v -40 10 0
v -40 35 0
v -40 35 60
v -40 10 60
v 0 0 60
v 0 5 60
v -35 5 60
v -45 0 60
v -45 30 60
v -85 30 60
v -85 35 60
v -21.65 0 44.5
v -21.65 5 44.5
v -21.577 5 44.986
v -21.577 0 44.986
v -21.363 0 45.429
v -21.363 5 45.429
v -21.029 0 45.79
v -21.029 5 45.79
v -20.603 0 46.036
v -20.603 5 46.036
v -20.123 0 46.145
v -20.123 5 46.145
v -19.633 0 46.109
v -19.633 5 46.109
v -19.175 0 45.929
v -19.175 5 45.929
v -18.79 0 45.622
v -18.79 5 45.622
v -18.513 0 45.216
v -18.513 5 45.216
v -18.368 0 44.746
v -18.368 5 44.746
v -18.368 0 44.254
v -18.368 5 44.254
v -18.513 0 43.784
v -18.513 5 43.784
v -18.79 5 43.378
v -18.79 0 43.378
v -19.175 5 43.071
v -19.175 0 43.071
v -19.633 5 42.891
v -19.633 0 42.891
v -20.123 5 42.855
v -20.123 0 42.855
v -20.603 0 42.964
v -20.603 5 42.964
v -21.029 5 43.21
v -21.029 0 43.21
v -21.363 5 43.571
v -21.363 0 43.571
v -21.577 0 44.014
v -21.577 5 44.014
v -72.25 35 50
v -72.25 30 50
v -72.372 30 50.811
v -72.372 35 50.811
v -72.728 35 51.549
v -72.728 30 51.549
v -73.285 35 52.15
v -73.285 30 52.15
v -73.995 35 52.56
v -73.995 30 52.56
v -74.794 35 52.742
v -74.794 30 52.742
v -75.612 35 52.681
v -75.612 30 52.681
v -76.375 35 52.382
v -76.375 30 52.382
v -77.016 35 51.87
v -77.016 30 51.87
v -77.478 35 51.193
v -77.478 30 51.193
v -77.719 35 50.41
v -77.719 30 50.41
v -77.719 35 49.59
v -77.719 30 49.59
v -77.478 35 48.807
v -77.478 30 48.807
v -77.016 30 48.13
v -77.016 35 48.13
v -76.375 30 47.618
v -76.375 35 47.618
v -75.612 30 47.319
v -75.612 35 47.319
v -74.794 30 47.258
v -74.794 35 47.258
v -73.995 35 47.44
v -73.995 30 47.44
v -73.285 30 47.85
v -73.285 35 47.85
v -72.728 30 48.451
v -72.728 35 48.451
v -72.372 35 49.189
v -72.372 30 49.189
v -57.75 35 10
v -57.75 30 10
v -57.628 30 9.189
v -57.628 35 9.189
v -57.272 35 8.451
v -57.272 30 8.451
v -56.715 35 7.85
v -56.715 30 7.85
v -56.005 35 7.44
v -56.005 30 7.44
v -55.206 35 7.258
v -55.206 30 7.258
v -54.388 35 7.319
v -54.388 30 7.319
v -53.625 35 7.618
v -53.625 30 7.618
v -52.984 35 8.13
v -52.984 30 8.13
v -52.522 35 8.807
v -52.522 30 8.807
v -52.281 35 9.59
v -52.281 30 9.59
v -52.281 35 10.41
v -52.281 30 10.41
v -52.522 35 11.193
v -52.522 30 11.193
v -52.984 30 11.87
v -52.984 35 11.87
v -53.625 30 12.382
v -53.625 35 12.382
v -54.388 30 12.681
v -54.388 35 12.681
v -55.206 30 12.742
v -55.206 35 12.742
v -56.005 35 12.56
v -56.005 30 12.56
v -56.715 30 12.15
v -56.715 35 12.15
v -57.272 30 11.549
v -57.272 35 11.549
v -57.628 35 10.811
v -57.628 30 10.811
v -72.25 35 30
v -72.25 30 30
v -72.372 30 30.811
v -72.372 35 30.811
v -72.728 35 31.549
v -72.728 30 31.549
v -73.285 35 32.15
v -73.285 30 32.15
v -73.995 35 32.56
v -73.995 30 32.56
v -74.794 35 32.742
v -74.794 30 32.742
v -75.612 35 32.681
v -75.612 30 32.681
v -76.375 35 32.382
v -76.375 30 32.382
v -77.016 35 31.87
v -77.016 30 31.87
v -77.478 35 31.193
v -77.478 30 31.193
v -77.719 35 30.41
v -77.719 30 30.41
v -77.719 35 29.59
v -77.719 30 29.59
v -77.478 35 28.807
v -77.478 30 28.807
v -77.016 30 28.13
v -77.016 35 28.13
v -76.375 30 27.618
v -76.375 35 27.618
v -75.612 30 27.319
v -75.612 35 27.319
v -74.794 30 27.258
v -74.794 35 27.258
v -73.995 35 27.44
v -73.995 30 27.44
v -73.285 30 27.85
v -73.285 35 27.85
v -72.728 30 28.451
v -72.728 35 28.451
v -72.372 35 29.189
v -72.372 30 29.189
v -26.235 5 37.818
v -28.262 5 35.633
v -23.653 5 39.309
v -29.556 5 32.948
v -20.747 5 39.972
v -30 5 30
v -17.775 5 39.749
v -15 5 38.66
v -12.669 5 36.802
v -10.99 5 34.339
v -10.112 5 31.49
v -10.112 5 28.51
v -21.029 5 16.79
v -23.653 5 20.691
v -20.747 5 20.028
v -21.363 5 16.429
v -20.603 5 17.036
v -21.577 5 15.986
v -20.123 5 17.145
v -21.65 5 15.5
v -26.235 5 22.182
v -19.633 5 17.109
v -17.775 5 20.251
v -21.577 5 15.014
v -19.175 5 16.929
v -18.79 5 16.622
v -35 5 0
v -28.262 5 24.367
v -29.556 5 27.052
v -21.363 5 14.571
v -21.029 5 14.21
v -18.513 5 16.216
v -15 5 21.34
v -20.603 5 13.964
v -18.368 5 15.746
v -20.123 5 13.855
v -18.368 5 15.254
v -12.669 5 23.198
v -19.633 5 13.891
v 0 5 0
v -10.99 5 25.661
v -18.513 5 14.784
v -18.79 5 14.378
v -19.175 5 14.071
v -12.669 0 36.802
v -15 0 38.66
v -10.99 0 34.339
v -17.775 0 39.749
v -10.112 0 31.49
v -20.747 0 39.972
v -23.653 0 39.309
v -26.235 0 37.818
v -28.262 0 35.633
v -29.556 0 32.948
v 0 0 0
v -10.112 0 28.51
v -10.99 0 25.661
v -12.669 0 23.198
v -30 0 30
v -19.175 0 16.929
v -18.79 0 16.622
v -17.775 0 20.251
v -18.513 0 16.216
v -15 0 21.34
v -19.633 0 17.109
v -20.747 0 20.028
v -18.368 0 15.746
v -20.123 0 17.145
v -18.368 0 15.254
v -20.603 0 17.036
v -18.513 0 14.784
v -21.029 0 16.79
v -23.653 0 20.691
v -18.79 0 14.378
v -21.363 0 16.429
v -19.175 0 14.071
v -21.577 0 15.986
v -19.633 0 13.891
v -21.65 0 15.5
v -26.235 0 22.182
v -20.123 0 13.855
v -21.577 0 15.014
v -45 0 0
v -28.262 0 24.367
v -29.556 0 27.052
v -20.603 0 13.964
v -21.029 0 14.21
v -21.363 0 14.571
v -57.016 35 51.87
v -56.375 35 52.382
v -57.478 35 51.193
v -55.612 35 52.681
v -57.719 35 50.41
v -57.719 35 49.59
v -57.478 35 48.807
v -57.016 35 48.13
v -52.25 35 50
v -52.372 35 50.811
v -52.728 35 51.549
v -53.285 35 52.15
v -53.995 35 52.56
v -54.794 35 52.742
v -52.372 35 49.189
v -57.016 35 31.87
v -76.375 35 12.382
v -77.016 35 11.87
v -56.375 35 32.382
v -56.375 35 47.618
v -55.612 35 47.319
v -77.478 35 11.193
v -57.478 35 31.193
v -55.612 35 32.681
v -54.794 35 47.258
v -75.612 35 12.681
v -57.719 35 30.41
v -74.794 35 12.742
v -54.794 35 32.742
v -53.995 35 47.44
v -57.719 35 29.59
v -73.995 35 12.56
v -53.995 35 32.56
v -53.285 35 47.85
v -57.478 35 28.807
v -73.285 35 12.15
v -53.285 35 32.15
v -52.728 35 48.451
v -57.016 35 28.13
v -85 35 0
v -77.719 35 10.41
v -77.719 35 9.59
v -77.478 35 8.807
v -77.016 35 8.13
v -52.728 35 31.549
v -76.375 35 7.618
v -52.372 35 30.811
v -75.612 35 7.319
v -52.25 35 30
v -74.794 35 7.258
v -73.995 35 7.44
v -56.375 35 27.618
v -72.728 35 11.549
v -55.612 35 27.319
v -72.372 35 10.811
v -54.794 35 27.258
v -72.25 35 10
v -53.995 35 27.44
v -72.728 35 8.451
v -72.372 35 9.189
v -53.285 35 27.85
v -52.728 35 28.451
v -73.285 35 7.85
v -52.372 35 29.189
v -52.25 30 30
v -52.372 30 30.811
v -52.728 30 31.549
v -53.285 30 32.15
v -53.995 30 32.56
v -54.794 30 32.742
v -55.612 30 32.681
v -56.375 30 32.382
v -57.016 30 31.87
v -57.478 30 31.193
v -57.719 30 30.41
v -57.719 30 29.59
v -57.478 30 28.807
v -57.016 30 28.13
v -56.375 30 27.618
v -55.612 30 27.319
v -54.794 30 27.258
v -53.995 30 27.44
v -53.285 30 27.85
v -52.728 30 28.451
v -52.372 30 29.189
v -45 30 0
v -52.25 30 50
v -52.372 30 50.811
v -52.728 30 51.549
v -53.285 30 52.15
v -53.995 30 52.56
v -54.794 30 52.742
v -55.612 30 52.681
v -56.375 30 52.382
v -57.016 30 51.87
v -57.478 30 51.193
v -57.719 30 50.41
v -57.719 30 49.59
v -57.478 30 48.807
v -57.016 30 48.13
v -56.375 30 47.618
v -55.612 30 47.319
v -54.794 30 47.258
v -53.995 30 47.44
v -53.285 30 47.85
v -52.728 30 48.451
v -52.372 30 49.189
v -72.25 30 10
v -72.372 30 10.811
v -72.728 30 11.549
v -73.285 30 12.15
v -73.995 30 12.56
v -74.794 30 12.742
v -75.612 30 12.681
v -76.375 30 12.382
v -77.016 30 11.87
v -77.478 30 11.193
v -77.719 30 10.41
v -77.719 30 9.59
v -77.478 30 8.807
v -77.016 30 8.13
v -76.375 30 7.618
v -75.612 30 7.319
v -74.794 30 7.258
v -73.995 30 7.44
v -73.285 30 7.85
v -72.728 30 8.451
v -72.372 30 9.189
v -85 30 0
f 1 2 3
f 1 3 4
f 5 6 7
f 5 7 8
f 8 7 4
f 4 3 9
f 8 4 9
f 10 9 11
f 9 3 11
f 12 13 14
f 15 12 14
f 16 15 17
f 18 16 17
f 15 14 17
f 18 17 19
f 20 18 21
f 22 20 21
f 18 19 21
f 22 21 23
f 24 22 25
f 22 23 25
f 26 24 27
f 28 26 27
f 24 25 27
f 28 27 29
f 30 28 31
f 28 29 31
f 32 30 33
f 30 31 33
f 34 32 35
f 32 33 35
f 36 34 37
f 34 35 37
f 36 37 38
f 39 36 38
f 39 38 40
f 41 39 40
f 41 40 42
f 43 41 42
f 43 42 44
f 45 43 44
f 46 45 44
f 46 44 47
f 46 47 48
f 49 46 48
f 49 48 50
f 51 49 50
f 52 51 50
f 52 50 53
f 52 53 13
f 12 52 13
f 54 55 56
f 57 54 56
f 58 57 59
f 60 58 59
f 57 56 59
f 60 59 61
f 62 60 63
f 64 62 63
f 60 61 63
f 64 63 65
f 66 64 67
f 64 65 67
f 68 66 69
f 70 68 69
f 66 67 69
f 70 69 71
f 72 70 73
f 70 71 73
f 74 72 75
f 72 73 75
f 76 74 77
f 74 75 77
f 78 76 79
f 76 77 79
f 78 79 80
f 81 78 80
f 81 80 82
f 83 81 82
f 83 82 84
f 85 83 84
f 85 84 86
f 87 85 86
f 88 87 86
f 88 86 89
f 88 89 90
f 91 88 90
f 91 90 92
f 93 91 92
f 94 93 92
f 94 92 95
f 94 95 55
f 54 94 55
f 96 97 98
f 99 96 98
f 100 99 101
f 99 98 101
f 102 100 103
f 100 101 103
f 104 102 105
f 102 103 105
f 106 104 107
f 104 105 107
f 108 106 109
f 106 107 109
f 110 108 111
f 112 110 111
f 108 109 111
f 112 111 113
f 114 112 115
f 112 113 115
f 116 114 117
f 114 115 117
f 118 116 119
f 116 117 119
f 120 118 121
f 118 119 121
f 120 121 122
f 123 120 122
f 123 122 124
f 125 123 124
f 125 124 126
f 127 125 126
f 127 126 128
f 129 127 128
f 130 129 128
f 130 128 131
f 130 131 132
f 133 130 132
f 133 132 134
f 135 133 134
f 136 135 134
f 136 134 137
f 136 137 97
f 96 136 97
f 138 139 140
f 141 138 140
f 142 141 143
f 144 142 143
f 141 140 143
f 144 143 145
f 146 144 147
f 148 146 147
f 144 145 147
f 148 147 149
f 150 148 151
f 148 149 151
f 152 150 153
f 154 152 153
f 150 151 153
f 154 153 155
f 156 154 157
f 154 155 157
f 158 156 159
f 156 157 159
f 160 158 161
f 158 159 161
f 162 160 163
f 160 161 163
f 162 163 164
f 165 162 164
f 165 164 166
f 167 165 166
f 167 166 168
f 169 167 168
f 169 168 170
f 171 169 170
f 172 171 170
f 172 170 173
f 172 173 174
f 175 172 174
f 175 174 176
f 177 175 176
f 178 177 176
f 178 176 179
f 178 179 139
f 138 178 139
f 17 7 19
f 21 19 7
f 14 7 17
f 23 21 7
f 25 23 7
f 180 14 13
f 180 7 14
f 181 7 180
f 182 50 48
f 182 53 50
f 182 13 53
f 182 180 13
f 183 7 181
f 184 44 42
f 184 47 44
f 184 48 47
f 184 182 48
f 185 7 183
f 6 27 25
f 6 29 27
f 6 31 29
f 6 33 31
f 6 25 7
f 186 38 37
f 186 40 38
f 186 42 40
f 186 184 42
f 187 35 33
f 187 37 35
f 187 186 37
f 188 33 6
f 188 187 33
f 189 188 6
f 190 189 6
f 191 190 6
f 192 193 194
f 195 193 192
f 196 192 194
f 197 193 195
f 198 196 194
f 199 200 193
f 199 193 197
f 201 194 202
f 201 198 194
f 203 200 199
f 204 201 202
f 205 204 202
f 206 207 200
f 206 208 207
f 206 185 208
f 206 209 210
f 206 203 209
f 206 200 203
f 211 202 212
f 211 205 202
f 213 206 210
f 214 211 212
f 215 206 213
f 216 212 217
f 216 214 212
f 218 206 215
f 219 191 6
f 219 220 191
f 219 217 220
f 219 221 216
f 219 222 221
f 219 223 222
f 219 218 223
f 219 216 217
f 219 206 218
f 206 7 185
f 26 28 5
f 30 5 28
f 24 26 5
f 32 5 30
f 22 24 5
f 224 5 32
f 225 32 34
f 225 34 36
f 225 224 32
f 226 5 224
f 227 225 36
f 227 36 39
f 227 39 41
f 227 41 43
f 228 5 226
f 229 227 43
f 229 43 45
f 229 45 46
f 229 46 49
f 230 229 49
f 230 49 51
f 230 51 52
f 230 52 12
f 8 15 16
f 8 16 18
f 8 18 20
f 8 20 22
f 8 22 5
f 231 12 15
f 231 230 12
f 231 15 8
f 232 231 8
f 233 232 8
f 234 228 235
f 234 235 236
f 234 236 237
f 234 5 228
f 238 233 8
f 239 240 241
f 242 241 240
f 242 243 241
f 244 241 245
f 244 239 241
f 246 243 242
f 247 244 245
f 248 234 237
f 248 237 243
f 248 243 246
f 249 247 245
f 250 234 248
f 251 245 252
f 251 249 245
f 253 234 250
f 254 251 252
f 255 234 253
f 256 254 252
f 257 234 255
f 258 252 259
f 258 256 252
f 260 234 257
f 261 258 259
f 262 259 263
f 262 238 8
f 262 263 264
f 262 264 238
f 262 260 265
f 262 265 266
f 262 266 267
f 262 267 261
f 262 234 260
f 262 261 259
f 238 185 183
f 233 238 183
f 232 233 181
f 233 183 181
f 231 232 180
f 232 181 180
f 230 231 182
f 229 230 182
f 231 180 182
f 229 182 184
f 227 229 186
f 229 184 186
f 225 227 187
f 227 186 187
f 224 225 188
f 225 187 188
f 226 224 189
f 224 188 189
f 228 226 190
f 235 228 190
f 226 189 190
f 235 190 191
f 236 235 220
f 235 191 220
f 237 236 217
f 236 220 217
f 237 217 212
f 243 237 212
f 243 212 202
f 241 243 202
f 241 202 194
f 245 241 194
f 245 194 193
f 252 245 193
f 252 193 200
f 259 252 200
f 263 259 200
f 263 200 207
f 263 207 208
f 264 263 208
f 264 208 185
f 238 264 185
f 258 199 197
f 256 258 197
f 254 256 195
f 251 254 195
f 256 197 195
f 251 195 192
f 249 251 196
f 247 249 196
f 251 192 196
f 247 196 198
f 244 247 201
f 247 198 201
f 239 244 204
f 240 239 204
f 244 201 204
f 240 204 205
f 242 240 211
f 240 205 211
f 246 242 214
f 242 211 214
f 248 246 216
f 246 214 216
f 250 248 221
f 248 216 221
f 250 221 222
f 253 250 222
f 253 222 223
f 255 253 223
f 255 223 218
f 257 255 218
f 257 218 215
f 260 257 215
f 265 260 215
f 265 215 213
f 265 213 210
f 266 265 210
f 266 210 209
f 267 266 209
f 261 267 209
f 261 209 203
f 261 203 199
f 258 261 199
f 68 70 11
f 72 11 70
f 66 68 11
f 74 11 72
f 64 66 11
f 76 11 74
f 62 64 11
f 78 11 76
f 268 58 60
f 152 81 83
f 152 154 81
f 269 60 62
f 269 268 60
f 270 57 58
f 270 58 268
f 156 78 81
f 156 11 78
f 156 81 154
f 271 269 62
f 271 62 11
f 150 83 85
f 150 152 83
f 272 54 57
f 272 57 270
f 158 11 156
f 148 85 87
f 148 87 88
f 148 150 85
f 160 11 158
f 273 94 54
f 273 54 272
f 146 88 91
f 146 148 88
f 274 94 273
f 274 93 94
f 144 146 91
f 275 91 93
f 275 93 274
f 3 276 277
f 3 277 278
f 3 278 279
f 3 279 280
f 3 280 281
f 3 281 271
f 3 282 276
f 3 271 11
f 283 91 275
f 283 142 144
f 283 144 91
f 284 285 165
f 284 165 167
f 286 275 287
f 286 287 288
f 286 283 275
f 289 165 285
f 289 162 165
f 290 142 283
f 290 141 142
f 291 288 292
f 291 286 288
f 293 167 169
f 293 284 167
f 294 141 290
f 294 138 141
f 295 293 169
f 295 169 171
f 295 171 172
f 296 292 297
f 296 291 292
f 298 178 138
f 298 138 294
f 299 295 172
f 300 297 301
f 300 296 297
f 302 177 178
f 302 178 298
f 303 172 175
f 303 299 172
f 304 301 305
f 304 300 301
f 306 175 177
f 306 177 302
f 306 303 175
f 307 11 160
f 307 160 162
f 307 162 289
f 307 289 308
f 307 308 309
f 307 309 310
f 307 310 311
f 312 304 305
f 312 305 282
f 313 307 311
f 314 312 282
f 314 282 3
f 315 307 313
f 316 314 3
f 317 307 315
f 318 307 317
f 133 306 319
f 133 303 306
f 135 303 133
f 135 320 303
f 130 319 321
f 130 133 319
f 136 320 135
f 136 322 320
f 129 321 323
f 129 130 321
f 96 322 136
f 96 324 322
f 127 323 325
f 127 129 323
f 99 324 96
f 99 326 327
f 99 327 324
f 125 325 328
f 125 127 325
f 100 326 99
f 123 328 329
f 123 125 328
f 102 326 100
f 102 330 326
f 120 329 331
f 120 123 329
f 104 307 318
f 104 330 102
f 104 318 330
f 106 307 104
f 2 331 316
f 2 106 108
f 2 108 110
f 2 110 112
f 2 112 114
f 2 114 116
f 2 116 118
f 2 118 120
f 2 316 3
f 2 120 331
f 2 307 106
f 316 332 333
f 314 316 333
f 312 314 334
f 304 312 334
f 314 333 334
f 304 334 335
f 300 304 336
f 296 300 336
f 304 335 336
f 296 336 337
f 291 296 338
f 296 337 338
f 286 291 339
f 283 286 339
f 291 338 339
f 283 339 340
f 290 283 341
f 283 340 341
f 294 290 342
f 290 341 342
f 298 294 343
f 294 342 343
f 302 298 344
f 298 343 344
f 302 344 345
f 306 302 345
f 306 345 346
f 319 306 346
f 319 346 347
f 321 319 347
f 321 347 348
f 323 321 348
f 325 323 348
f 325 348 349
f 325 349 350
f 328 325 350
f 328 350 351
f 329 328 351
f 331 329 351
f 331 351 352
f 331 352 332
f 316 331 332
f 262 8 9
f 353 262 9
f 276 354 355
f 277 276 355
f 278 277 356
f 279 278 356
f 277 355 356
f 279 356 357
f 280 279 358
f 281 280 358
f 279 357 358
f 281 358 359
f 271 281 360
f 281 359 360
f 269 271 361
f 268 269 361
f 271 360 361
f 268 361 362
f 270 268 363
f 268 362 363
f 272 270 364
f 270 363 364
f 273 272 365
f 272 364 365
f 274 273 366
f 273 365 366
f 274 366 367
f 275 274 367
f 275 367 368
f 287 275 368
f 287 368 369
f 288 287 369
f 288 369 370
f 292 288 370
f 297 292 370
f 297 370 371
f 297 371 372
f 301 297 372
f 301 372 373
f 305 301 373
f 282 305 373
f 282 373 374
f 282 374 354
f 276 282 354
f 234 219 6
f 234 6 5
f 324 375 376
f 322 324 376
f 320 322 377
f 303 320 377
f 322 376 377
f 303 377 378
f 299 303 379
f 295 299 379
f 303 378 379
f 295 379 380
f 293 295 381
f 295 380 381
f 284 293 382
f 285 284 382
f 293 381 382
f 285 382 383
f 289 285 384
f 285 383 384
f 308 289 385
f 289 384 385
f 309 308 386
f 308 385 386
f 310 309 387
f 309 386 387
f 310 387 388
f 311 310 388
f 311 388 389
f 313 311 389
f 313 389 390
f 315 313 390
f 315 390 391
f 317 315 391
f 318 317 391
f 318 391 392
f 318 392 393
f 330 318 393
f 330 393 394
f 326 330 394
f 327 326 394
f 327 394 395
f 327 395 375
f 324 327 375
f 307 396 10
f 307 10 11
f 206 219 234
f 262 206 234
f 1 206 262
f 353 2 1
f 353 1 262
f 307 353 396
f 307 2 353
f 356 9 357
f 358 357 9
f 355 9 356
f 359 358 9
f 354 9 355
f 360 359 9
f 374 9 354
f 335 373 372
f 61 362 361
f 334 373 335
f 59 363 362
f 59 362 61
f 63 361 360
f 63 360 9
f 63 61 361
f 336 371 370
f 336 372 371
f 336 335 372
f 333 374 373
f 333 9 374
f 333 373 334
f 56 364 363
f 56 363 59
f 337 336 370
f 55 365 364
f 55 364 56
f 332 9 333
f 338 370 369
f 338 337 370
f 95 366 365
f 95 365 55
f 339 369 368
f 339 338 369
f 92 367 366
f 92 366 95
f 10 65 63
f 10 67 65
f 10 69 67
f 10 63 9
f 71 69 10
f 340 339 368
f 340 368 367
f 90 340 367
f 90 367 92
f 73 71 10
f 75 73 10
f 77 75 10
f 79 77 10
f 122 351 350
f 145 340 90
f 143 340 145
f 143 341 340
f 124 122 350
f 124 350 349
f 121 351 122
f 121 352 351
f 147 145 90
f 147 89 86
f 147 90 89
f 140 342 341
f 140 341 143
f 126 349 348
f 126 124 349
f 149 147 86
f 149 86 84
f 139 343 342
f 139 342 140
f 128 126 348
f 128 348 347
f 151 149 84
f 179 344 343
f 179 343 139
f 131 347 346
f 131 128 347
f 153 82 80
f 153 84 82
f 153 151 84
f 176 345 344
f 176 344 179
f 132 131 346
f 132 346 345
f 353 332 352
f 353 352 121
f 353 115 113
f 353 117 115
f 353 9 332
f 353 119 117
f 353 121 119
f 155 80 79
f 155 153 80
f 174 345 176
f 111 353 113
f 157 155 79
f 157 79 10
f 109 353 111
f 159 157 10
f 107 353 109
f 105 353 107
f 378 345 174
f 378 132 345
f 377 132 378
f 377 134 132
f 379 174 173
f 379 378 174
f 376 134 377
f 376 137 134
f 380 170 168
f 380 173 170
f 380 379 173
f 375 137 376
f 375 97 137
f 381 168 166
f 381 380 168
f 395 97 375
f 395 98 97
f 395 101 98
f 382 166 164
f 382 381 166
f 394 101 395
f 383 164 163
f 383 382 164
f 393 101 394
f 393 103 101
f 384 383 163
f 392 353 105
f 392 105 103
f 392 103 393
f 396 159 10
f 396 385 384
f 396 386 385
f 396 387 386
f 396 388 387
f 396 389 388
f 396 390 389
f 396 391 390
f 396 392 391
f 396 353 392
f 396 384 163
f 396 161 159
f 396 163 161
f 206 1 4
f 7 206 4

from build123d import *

# Parameters (mm, degrees)
EXTRUDE_1_DEPTH     = 60
SKETCH_2_R          = 2.75
CUT_EXTRUDE_1_DEPTH = 109.282039139
SKETCH_3_R          = 10
SKETCH_3_R_2        = 1.65
CUT_EXTRUDE_2_DEPTH = 109.282039139
CHAMFER_1_SIZE      = 5


with BuildPart() as part:
    # 草图1 → 凸台-拉伸1 (new body)
    with BuildSketch(Plane.XY):
        Polygon((0, 0), (-45, 0), (-45, 30), (-85, 30), (-85, 35), (-40, 35), (-40, 5), (0, 5), align=None)
    extrude(amount=EXTRUDE_1_DEPTH)

    # 草图2 → 切除-拉伸1 (cut, through all)
    with BuildSketch(Plane.XZ.offset(-30)):
        with Locations((-55, 50)):
            Circle(SKETCH_2_R)
        with Locations((-55, 30)):
            Circle(SKETCH_2_R)
        with Locations((-75, 30)):
            Circle(SKETCH_2_R)
        with Locations(Location((-55, 10, 0), (0, 0, 180))):
            Circle(SKETCH_2_R)
        with Locations((-75, 50)):
            Circle(SKETCH_2_R)
        with Locations((-75, 10)):
            Circle(SKETCH_2_R)
    extrude(amount=-CUT_EXTRUDE_1_DEPTH, mode=Mode.SUBTRACT)

    # 草图3 → 切除-拉伸2 (cut, through all)
    with BuildSketch(Plane(origin=(0, 5, 0), x_dir=(1, 0, 0), z_dir=(0, 1, 0))):
        with Locations(Location((-20, -30, 0), (0, 0, 180))):
            Circle(SKETCH_3_R)
        with Locations(Location((-20, -15.5, 0), (0, 0, 180))):
            Circle(SKETCH_3_R_2)
        with Locations(Location((-20, -44.5, 0), (0, 0, 180))):
            Circle(SKETCH_3_R_2)
    extrude(amount=-CUT_EXTRUDE_2_DEPTH, mode=Mode.SUBTRACT)

    # 倒角1
    chamfer_1_edges = [part.edges().sort_by_distance(p)[0] for p in [
        (-40, 5, 30),
    ]]
    chamfer(chamfer_1_edges, length=CHAMFER_1_SIZE)


solid = part.part
